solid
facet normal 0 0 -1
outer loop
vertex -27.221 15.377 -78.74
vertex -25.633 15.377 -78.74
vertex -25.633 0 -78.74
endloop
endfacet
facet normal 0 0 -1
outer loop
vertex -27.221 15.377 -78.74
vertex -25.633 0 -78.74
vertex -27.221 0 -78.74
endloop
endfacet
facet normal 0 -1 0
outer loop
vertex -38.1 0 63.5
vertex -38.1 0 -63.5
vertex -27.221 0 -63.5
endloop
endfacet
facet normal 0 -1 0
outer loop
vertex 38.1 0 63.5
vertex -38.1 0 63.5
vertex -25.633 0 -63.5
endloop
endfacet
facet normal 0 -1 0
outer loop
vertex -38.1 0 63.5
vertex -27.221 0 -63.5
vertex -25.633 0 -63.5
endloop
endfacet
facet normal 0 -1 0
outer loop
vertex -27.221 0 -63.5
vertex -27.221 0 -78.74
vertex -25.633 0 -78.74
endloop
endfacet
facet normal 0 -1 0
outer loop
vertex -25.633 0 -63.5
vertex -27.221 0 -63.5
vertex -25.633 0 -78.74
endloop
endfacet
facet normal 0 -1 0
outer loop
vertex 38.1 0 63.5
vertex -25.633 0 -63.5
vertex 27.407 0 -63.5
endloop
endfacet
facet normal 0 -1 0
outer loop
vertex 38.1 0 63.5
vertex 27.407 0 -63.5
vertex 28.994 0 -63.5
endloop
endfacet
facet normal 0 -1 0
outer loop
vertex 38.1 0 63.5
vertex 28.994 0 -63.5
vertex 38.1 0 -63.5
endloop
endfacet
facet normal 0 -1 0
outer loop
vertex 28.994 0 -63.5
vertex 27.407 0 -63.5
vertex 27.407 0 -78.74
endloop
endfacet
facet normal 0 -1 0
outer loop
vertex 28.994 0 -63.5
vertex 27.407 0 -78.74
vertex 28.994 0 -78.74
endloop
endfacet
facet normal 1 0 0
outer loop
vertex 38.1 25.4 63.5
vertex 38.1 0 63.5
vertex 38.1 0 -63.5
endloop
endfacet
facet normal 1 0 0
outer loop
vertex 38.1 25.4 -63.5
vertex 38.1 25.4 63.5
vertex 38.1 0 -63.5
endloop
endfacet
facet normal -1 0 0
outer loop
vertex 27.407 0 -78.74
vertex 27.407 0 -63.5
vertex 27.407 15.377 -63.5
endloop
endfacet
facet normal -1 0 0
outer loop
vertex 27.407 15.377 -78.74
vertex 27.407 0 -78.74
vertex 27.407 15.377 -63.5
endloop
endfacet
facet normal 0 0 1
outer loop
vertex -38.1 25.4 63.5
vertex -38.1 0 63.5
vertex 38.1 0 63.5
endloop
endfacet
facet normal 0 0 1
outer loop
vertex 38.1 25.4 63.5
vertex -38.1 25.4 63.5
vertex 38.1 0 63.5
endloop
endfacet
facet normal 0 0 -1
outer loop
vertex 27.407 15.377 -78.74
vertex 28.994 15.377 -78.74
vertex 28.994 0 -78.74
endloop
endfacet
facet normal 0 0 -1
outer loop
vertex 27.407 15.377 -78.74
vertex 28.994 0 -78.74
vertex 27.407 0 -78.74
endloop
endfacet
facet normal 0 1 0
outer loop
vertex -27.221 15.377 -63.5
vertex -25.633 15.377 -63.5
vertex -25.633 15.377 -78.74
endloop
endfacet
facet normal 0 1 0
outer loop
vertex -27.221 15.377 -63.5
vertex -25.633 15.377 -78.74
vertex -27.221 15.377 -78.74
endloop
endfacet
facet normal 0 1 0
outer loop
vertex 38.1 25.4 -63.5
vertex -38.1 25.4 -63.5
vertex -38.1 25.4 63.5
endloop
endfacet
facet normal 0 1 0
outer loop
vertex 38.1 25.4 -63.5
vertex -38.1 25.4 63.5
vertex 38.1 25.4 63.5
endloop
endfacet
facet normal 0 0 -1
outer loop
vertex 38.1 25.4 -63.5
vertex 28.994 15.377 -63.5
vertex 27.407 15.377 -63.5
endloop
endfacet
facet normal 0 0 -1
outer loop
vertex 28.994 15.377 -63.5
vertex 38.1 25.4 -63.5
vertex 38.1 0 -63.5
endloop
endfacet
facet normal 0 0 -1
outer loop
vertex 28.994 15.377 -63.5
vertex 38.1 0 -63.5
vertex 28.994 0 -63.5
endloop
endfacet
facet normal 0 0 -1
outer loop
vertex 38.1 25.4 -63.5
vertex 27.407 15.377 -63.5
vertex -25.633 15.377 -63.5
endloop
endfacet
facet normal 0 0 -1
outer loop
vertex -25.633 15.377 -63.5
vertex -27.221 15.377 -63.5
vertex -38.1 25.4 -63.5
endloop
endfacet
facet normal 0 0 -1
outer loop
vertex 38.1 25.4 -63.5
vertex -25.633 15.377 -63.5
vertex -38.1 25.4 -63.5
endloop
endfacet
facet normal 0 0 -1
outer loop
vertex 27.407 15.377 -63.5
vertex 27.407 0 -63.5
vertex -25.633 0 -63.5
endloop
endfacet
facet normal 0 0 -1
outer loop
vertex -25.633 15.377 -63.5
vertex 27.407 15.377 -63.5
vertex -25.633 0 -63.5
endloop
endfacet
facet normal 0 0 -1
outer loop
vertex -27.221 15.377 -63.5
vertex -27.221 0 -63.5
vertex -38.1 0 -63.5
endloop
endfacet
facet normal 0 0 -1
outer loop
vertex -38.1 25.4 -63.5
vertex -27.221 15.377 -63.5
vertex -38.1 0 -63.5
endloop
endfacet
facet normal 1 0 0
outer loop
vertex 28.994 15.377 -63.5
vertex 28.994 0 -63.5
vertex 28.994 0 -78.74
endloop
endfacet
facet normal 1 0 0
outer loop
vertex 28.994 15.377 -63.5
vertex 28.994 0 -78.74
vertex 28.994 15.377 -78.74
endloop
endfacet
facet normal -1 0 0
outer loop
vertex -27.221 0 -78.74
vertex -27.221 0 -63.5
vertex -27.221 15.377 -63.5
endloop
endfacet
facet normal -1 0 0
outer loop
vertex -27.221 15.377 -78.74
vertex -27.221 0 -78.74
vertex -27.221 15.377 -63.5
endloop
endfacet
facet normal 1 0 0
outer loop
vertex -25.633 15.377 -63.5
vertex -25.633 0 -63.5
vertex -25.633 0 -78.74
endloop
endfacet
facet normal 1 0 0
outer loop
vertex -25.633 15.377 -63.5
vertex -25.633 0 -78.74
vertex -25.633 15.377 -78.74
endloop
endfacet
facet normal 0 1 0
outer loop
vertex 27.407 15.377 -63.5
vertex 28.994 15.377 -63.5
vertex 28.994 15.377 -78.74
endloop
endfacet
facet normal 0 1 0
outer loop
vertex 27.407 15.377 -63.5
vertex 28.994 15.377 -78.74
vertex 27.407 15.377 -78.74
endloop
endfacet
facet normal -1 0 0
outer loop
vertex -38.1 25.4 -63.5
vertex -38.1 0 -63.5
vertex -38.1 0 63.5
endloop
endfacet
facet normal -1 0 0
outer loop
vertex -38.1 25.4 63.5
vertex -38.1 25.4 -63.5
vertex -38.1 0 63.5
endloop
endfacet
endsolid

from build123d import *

# Parameters (mm, degrees)
BOSS_EXTRUDE1_DEPTH = 25.4
SKETCH5_W           = 1.5875
SKETCH5_H           = 15.37716
BOSS_EXTRUDE3_DEPTH = 15.24


with BuildPart() as part:
    # Sketch1 → Boss-Extrude1 (new body)
    with BuildSketch(Plane(origin=(0, 0, 0), x_dir=(1, 0, 0), z_dir=(0, 1, 0))):
        Polygon((38.1, 63.5), (28.9941, 63.5), (-28.9941, 63.5), (-38.1, 63.5), (-38.1, -63.5), (38.1, -63.5), align=None)
    extrude(amount=BOSS_EXTRUDE1_DEPTH)

    # Sketch5 → Boss-Extrude3 (add)
    with BuildSketch(Plane(origin=(0, 0, -63.5), x_dir=(-1, 0, 0), z_dir=(0, 0, -1))):
        with Locations((-28.20035, 7.68858)):
            Rectangle(SKETCH5_W, SKETCH5_H)
        with Locations((26.42680374, 7.68858)):
            Rectangle(SKETCH5_W, SKETCH5_H)
    extrude(amount=BOSS_EXTRUDE3_DEPTH)


solid = part.part
